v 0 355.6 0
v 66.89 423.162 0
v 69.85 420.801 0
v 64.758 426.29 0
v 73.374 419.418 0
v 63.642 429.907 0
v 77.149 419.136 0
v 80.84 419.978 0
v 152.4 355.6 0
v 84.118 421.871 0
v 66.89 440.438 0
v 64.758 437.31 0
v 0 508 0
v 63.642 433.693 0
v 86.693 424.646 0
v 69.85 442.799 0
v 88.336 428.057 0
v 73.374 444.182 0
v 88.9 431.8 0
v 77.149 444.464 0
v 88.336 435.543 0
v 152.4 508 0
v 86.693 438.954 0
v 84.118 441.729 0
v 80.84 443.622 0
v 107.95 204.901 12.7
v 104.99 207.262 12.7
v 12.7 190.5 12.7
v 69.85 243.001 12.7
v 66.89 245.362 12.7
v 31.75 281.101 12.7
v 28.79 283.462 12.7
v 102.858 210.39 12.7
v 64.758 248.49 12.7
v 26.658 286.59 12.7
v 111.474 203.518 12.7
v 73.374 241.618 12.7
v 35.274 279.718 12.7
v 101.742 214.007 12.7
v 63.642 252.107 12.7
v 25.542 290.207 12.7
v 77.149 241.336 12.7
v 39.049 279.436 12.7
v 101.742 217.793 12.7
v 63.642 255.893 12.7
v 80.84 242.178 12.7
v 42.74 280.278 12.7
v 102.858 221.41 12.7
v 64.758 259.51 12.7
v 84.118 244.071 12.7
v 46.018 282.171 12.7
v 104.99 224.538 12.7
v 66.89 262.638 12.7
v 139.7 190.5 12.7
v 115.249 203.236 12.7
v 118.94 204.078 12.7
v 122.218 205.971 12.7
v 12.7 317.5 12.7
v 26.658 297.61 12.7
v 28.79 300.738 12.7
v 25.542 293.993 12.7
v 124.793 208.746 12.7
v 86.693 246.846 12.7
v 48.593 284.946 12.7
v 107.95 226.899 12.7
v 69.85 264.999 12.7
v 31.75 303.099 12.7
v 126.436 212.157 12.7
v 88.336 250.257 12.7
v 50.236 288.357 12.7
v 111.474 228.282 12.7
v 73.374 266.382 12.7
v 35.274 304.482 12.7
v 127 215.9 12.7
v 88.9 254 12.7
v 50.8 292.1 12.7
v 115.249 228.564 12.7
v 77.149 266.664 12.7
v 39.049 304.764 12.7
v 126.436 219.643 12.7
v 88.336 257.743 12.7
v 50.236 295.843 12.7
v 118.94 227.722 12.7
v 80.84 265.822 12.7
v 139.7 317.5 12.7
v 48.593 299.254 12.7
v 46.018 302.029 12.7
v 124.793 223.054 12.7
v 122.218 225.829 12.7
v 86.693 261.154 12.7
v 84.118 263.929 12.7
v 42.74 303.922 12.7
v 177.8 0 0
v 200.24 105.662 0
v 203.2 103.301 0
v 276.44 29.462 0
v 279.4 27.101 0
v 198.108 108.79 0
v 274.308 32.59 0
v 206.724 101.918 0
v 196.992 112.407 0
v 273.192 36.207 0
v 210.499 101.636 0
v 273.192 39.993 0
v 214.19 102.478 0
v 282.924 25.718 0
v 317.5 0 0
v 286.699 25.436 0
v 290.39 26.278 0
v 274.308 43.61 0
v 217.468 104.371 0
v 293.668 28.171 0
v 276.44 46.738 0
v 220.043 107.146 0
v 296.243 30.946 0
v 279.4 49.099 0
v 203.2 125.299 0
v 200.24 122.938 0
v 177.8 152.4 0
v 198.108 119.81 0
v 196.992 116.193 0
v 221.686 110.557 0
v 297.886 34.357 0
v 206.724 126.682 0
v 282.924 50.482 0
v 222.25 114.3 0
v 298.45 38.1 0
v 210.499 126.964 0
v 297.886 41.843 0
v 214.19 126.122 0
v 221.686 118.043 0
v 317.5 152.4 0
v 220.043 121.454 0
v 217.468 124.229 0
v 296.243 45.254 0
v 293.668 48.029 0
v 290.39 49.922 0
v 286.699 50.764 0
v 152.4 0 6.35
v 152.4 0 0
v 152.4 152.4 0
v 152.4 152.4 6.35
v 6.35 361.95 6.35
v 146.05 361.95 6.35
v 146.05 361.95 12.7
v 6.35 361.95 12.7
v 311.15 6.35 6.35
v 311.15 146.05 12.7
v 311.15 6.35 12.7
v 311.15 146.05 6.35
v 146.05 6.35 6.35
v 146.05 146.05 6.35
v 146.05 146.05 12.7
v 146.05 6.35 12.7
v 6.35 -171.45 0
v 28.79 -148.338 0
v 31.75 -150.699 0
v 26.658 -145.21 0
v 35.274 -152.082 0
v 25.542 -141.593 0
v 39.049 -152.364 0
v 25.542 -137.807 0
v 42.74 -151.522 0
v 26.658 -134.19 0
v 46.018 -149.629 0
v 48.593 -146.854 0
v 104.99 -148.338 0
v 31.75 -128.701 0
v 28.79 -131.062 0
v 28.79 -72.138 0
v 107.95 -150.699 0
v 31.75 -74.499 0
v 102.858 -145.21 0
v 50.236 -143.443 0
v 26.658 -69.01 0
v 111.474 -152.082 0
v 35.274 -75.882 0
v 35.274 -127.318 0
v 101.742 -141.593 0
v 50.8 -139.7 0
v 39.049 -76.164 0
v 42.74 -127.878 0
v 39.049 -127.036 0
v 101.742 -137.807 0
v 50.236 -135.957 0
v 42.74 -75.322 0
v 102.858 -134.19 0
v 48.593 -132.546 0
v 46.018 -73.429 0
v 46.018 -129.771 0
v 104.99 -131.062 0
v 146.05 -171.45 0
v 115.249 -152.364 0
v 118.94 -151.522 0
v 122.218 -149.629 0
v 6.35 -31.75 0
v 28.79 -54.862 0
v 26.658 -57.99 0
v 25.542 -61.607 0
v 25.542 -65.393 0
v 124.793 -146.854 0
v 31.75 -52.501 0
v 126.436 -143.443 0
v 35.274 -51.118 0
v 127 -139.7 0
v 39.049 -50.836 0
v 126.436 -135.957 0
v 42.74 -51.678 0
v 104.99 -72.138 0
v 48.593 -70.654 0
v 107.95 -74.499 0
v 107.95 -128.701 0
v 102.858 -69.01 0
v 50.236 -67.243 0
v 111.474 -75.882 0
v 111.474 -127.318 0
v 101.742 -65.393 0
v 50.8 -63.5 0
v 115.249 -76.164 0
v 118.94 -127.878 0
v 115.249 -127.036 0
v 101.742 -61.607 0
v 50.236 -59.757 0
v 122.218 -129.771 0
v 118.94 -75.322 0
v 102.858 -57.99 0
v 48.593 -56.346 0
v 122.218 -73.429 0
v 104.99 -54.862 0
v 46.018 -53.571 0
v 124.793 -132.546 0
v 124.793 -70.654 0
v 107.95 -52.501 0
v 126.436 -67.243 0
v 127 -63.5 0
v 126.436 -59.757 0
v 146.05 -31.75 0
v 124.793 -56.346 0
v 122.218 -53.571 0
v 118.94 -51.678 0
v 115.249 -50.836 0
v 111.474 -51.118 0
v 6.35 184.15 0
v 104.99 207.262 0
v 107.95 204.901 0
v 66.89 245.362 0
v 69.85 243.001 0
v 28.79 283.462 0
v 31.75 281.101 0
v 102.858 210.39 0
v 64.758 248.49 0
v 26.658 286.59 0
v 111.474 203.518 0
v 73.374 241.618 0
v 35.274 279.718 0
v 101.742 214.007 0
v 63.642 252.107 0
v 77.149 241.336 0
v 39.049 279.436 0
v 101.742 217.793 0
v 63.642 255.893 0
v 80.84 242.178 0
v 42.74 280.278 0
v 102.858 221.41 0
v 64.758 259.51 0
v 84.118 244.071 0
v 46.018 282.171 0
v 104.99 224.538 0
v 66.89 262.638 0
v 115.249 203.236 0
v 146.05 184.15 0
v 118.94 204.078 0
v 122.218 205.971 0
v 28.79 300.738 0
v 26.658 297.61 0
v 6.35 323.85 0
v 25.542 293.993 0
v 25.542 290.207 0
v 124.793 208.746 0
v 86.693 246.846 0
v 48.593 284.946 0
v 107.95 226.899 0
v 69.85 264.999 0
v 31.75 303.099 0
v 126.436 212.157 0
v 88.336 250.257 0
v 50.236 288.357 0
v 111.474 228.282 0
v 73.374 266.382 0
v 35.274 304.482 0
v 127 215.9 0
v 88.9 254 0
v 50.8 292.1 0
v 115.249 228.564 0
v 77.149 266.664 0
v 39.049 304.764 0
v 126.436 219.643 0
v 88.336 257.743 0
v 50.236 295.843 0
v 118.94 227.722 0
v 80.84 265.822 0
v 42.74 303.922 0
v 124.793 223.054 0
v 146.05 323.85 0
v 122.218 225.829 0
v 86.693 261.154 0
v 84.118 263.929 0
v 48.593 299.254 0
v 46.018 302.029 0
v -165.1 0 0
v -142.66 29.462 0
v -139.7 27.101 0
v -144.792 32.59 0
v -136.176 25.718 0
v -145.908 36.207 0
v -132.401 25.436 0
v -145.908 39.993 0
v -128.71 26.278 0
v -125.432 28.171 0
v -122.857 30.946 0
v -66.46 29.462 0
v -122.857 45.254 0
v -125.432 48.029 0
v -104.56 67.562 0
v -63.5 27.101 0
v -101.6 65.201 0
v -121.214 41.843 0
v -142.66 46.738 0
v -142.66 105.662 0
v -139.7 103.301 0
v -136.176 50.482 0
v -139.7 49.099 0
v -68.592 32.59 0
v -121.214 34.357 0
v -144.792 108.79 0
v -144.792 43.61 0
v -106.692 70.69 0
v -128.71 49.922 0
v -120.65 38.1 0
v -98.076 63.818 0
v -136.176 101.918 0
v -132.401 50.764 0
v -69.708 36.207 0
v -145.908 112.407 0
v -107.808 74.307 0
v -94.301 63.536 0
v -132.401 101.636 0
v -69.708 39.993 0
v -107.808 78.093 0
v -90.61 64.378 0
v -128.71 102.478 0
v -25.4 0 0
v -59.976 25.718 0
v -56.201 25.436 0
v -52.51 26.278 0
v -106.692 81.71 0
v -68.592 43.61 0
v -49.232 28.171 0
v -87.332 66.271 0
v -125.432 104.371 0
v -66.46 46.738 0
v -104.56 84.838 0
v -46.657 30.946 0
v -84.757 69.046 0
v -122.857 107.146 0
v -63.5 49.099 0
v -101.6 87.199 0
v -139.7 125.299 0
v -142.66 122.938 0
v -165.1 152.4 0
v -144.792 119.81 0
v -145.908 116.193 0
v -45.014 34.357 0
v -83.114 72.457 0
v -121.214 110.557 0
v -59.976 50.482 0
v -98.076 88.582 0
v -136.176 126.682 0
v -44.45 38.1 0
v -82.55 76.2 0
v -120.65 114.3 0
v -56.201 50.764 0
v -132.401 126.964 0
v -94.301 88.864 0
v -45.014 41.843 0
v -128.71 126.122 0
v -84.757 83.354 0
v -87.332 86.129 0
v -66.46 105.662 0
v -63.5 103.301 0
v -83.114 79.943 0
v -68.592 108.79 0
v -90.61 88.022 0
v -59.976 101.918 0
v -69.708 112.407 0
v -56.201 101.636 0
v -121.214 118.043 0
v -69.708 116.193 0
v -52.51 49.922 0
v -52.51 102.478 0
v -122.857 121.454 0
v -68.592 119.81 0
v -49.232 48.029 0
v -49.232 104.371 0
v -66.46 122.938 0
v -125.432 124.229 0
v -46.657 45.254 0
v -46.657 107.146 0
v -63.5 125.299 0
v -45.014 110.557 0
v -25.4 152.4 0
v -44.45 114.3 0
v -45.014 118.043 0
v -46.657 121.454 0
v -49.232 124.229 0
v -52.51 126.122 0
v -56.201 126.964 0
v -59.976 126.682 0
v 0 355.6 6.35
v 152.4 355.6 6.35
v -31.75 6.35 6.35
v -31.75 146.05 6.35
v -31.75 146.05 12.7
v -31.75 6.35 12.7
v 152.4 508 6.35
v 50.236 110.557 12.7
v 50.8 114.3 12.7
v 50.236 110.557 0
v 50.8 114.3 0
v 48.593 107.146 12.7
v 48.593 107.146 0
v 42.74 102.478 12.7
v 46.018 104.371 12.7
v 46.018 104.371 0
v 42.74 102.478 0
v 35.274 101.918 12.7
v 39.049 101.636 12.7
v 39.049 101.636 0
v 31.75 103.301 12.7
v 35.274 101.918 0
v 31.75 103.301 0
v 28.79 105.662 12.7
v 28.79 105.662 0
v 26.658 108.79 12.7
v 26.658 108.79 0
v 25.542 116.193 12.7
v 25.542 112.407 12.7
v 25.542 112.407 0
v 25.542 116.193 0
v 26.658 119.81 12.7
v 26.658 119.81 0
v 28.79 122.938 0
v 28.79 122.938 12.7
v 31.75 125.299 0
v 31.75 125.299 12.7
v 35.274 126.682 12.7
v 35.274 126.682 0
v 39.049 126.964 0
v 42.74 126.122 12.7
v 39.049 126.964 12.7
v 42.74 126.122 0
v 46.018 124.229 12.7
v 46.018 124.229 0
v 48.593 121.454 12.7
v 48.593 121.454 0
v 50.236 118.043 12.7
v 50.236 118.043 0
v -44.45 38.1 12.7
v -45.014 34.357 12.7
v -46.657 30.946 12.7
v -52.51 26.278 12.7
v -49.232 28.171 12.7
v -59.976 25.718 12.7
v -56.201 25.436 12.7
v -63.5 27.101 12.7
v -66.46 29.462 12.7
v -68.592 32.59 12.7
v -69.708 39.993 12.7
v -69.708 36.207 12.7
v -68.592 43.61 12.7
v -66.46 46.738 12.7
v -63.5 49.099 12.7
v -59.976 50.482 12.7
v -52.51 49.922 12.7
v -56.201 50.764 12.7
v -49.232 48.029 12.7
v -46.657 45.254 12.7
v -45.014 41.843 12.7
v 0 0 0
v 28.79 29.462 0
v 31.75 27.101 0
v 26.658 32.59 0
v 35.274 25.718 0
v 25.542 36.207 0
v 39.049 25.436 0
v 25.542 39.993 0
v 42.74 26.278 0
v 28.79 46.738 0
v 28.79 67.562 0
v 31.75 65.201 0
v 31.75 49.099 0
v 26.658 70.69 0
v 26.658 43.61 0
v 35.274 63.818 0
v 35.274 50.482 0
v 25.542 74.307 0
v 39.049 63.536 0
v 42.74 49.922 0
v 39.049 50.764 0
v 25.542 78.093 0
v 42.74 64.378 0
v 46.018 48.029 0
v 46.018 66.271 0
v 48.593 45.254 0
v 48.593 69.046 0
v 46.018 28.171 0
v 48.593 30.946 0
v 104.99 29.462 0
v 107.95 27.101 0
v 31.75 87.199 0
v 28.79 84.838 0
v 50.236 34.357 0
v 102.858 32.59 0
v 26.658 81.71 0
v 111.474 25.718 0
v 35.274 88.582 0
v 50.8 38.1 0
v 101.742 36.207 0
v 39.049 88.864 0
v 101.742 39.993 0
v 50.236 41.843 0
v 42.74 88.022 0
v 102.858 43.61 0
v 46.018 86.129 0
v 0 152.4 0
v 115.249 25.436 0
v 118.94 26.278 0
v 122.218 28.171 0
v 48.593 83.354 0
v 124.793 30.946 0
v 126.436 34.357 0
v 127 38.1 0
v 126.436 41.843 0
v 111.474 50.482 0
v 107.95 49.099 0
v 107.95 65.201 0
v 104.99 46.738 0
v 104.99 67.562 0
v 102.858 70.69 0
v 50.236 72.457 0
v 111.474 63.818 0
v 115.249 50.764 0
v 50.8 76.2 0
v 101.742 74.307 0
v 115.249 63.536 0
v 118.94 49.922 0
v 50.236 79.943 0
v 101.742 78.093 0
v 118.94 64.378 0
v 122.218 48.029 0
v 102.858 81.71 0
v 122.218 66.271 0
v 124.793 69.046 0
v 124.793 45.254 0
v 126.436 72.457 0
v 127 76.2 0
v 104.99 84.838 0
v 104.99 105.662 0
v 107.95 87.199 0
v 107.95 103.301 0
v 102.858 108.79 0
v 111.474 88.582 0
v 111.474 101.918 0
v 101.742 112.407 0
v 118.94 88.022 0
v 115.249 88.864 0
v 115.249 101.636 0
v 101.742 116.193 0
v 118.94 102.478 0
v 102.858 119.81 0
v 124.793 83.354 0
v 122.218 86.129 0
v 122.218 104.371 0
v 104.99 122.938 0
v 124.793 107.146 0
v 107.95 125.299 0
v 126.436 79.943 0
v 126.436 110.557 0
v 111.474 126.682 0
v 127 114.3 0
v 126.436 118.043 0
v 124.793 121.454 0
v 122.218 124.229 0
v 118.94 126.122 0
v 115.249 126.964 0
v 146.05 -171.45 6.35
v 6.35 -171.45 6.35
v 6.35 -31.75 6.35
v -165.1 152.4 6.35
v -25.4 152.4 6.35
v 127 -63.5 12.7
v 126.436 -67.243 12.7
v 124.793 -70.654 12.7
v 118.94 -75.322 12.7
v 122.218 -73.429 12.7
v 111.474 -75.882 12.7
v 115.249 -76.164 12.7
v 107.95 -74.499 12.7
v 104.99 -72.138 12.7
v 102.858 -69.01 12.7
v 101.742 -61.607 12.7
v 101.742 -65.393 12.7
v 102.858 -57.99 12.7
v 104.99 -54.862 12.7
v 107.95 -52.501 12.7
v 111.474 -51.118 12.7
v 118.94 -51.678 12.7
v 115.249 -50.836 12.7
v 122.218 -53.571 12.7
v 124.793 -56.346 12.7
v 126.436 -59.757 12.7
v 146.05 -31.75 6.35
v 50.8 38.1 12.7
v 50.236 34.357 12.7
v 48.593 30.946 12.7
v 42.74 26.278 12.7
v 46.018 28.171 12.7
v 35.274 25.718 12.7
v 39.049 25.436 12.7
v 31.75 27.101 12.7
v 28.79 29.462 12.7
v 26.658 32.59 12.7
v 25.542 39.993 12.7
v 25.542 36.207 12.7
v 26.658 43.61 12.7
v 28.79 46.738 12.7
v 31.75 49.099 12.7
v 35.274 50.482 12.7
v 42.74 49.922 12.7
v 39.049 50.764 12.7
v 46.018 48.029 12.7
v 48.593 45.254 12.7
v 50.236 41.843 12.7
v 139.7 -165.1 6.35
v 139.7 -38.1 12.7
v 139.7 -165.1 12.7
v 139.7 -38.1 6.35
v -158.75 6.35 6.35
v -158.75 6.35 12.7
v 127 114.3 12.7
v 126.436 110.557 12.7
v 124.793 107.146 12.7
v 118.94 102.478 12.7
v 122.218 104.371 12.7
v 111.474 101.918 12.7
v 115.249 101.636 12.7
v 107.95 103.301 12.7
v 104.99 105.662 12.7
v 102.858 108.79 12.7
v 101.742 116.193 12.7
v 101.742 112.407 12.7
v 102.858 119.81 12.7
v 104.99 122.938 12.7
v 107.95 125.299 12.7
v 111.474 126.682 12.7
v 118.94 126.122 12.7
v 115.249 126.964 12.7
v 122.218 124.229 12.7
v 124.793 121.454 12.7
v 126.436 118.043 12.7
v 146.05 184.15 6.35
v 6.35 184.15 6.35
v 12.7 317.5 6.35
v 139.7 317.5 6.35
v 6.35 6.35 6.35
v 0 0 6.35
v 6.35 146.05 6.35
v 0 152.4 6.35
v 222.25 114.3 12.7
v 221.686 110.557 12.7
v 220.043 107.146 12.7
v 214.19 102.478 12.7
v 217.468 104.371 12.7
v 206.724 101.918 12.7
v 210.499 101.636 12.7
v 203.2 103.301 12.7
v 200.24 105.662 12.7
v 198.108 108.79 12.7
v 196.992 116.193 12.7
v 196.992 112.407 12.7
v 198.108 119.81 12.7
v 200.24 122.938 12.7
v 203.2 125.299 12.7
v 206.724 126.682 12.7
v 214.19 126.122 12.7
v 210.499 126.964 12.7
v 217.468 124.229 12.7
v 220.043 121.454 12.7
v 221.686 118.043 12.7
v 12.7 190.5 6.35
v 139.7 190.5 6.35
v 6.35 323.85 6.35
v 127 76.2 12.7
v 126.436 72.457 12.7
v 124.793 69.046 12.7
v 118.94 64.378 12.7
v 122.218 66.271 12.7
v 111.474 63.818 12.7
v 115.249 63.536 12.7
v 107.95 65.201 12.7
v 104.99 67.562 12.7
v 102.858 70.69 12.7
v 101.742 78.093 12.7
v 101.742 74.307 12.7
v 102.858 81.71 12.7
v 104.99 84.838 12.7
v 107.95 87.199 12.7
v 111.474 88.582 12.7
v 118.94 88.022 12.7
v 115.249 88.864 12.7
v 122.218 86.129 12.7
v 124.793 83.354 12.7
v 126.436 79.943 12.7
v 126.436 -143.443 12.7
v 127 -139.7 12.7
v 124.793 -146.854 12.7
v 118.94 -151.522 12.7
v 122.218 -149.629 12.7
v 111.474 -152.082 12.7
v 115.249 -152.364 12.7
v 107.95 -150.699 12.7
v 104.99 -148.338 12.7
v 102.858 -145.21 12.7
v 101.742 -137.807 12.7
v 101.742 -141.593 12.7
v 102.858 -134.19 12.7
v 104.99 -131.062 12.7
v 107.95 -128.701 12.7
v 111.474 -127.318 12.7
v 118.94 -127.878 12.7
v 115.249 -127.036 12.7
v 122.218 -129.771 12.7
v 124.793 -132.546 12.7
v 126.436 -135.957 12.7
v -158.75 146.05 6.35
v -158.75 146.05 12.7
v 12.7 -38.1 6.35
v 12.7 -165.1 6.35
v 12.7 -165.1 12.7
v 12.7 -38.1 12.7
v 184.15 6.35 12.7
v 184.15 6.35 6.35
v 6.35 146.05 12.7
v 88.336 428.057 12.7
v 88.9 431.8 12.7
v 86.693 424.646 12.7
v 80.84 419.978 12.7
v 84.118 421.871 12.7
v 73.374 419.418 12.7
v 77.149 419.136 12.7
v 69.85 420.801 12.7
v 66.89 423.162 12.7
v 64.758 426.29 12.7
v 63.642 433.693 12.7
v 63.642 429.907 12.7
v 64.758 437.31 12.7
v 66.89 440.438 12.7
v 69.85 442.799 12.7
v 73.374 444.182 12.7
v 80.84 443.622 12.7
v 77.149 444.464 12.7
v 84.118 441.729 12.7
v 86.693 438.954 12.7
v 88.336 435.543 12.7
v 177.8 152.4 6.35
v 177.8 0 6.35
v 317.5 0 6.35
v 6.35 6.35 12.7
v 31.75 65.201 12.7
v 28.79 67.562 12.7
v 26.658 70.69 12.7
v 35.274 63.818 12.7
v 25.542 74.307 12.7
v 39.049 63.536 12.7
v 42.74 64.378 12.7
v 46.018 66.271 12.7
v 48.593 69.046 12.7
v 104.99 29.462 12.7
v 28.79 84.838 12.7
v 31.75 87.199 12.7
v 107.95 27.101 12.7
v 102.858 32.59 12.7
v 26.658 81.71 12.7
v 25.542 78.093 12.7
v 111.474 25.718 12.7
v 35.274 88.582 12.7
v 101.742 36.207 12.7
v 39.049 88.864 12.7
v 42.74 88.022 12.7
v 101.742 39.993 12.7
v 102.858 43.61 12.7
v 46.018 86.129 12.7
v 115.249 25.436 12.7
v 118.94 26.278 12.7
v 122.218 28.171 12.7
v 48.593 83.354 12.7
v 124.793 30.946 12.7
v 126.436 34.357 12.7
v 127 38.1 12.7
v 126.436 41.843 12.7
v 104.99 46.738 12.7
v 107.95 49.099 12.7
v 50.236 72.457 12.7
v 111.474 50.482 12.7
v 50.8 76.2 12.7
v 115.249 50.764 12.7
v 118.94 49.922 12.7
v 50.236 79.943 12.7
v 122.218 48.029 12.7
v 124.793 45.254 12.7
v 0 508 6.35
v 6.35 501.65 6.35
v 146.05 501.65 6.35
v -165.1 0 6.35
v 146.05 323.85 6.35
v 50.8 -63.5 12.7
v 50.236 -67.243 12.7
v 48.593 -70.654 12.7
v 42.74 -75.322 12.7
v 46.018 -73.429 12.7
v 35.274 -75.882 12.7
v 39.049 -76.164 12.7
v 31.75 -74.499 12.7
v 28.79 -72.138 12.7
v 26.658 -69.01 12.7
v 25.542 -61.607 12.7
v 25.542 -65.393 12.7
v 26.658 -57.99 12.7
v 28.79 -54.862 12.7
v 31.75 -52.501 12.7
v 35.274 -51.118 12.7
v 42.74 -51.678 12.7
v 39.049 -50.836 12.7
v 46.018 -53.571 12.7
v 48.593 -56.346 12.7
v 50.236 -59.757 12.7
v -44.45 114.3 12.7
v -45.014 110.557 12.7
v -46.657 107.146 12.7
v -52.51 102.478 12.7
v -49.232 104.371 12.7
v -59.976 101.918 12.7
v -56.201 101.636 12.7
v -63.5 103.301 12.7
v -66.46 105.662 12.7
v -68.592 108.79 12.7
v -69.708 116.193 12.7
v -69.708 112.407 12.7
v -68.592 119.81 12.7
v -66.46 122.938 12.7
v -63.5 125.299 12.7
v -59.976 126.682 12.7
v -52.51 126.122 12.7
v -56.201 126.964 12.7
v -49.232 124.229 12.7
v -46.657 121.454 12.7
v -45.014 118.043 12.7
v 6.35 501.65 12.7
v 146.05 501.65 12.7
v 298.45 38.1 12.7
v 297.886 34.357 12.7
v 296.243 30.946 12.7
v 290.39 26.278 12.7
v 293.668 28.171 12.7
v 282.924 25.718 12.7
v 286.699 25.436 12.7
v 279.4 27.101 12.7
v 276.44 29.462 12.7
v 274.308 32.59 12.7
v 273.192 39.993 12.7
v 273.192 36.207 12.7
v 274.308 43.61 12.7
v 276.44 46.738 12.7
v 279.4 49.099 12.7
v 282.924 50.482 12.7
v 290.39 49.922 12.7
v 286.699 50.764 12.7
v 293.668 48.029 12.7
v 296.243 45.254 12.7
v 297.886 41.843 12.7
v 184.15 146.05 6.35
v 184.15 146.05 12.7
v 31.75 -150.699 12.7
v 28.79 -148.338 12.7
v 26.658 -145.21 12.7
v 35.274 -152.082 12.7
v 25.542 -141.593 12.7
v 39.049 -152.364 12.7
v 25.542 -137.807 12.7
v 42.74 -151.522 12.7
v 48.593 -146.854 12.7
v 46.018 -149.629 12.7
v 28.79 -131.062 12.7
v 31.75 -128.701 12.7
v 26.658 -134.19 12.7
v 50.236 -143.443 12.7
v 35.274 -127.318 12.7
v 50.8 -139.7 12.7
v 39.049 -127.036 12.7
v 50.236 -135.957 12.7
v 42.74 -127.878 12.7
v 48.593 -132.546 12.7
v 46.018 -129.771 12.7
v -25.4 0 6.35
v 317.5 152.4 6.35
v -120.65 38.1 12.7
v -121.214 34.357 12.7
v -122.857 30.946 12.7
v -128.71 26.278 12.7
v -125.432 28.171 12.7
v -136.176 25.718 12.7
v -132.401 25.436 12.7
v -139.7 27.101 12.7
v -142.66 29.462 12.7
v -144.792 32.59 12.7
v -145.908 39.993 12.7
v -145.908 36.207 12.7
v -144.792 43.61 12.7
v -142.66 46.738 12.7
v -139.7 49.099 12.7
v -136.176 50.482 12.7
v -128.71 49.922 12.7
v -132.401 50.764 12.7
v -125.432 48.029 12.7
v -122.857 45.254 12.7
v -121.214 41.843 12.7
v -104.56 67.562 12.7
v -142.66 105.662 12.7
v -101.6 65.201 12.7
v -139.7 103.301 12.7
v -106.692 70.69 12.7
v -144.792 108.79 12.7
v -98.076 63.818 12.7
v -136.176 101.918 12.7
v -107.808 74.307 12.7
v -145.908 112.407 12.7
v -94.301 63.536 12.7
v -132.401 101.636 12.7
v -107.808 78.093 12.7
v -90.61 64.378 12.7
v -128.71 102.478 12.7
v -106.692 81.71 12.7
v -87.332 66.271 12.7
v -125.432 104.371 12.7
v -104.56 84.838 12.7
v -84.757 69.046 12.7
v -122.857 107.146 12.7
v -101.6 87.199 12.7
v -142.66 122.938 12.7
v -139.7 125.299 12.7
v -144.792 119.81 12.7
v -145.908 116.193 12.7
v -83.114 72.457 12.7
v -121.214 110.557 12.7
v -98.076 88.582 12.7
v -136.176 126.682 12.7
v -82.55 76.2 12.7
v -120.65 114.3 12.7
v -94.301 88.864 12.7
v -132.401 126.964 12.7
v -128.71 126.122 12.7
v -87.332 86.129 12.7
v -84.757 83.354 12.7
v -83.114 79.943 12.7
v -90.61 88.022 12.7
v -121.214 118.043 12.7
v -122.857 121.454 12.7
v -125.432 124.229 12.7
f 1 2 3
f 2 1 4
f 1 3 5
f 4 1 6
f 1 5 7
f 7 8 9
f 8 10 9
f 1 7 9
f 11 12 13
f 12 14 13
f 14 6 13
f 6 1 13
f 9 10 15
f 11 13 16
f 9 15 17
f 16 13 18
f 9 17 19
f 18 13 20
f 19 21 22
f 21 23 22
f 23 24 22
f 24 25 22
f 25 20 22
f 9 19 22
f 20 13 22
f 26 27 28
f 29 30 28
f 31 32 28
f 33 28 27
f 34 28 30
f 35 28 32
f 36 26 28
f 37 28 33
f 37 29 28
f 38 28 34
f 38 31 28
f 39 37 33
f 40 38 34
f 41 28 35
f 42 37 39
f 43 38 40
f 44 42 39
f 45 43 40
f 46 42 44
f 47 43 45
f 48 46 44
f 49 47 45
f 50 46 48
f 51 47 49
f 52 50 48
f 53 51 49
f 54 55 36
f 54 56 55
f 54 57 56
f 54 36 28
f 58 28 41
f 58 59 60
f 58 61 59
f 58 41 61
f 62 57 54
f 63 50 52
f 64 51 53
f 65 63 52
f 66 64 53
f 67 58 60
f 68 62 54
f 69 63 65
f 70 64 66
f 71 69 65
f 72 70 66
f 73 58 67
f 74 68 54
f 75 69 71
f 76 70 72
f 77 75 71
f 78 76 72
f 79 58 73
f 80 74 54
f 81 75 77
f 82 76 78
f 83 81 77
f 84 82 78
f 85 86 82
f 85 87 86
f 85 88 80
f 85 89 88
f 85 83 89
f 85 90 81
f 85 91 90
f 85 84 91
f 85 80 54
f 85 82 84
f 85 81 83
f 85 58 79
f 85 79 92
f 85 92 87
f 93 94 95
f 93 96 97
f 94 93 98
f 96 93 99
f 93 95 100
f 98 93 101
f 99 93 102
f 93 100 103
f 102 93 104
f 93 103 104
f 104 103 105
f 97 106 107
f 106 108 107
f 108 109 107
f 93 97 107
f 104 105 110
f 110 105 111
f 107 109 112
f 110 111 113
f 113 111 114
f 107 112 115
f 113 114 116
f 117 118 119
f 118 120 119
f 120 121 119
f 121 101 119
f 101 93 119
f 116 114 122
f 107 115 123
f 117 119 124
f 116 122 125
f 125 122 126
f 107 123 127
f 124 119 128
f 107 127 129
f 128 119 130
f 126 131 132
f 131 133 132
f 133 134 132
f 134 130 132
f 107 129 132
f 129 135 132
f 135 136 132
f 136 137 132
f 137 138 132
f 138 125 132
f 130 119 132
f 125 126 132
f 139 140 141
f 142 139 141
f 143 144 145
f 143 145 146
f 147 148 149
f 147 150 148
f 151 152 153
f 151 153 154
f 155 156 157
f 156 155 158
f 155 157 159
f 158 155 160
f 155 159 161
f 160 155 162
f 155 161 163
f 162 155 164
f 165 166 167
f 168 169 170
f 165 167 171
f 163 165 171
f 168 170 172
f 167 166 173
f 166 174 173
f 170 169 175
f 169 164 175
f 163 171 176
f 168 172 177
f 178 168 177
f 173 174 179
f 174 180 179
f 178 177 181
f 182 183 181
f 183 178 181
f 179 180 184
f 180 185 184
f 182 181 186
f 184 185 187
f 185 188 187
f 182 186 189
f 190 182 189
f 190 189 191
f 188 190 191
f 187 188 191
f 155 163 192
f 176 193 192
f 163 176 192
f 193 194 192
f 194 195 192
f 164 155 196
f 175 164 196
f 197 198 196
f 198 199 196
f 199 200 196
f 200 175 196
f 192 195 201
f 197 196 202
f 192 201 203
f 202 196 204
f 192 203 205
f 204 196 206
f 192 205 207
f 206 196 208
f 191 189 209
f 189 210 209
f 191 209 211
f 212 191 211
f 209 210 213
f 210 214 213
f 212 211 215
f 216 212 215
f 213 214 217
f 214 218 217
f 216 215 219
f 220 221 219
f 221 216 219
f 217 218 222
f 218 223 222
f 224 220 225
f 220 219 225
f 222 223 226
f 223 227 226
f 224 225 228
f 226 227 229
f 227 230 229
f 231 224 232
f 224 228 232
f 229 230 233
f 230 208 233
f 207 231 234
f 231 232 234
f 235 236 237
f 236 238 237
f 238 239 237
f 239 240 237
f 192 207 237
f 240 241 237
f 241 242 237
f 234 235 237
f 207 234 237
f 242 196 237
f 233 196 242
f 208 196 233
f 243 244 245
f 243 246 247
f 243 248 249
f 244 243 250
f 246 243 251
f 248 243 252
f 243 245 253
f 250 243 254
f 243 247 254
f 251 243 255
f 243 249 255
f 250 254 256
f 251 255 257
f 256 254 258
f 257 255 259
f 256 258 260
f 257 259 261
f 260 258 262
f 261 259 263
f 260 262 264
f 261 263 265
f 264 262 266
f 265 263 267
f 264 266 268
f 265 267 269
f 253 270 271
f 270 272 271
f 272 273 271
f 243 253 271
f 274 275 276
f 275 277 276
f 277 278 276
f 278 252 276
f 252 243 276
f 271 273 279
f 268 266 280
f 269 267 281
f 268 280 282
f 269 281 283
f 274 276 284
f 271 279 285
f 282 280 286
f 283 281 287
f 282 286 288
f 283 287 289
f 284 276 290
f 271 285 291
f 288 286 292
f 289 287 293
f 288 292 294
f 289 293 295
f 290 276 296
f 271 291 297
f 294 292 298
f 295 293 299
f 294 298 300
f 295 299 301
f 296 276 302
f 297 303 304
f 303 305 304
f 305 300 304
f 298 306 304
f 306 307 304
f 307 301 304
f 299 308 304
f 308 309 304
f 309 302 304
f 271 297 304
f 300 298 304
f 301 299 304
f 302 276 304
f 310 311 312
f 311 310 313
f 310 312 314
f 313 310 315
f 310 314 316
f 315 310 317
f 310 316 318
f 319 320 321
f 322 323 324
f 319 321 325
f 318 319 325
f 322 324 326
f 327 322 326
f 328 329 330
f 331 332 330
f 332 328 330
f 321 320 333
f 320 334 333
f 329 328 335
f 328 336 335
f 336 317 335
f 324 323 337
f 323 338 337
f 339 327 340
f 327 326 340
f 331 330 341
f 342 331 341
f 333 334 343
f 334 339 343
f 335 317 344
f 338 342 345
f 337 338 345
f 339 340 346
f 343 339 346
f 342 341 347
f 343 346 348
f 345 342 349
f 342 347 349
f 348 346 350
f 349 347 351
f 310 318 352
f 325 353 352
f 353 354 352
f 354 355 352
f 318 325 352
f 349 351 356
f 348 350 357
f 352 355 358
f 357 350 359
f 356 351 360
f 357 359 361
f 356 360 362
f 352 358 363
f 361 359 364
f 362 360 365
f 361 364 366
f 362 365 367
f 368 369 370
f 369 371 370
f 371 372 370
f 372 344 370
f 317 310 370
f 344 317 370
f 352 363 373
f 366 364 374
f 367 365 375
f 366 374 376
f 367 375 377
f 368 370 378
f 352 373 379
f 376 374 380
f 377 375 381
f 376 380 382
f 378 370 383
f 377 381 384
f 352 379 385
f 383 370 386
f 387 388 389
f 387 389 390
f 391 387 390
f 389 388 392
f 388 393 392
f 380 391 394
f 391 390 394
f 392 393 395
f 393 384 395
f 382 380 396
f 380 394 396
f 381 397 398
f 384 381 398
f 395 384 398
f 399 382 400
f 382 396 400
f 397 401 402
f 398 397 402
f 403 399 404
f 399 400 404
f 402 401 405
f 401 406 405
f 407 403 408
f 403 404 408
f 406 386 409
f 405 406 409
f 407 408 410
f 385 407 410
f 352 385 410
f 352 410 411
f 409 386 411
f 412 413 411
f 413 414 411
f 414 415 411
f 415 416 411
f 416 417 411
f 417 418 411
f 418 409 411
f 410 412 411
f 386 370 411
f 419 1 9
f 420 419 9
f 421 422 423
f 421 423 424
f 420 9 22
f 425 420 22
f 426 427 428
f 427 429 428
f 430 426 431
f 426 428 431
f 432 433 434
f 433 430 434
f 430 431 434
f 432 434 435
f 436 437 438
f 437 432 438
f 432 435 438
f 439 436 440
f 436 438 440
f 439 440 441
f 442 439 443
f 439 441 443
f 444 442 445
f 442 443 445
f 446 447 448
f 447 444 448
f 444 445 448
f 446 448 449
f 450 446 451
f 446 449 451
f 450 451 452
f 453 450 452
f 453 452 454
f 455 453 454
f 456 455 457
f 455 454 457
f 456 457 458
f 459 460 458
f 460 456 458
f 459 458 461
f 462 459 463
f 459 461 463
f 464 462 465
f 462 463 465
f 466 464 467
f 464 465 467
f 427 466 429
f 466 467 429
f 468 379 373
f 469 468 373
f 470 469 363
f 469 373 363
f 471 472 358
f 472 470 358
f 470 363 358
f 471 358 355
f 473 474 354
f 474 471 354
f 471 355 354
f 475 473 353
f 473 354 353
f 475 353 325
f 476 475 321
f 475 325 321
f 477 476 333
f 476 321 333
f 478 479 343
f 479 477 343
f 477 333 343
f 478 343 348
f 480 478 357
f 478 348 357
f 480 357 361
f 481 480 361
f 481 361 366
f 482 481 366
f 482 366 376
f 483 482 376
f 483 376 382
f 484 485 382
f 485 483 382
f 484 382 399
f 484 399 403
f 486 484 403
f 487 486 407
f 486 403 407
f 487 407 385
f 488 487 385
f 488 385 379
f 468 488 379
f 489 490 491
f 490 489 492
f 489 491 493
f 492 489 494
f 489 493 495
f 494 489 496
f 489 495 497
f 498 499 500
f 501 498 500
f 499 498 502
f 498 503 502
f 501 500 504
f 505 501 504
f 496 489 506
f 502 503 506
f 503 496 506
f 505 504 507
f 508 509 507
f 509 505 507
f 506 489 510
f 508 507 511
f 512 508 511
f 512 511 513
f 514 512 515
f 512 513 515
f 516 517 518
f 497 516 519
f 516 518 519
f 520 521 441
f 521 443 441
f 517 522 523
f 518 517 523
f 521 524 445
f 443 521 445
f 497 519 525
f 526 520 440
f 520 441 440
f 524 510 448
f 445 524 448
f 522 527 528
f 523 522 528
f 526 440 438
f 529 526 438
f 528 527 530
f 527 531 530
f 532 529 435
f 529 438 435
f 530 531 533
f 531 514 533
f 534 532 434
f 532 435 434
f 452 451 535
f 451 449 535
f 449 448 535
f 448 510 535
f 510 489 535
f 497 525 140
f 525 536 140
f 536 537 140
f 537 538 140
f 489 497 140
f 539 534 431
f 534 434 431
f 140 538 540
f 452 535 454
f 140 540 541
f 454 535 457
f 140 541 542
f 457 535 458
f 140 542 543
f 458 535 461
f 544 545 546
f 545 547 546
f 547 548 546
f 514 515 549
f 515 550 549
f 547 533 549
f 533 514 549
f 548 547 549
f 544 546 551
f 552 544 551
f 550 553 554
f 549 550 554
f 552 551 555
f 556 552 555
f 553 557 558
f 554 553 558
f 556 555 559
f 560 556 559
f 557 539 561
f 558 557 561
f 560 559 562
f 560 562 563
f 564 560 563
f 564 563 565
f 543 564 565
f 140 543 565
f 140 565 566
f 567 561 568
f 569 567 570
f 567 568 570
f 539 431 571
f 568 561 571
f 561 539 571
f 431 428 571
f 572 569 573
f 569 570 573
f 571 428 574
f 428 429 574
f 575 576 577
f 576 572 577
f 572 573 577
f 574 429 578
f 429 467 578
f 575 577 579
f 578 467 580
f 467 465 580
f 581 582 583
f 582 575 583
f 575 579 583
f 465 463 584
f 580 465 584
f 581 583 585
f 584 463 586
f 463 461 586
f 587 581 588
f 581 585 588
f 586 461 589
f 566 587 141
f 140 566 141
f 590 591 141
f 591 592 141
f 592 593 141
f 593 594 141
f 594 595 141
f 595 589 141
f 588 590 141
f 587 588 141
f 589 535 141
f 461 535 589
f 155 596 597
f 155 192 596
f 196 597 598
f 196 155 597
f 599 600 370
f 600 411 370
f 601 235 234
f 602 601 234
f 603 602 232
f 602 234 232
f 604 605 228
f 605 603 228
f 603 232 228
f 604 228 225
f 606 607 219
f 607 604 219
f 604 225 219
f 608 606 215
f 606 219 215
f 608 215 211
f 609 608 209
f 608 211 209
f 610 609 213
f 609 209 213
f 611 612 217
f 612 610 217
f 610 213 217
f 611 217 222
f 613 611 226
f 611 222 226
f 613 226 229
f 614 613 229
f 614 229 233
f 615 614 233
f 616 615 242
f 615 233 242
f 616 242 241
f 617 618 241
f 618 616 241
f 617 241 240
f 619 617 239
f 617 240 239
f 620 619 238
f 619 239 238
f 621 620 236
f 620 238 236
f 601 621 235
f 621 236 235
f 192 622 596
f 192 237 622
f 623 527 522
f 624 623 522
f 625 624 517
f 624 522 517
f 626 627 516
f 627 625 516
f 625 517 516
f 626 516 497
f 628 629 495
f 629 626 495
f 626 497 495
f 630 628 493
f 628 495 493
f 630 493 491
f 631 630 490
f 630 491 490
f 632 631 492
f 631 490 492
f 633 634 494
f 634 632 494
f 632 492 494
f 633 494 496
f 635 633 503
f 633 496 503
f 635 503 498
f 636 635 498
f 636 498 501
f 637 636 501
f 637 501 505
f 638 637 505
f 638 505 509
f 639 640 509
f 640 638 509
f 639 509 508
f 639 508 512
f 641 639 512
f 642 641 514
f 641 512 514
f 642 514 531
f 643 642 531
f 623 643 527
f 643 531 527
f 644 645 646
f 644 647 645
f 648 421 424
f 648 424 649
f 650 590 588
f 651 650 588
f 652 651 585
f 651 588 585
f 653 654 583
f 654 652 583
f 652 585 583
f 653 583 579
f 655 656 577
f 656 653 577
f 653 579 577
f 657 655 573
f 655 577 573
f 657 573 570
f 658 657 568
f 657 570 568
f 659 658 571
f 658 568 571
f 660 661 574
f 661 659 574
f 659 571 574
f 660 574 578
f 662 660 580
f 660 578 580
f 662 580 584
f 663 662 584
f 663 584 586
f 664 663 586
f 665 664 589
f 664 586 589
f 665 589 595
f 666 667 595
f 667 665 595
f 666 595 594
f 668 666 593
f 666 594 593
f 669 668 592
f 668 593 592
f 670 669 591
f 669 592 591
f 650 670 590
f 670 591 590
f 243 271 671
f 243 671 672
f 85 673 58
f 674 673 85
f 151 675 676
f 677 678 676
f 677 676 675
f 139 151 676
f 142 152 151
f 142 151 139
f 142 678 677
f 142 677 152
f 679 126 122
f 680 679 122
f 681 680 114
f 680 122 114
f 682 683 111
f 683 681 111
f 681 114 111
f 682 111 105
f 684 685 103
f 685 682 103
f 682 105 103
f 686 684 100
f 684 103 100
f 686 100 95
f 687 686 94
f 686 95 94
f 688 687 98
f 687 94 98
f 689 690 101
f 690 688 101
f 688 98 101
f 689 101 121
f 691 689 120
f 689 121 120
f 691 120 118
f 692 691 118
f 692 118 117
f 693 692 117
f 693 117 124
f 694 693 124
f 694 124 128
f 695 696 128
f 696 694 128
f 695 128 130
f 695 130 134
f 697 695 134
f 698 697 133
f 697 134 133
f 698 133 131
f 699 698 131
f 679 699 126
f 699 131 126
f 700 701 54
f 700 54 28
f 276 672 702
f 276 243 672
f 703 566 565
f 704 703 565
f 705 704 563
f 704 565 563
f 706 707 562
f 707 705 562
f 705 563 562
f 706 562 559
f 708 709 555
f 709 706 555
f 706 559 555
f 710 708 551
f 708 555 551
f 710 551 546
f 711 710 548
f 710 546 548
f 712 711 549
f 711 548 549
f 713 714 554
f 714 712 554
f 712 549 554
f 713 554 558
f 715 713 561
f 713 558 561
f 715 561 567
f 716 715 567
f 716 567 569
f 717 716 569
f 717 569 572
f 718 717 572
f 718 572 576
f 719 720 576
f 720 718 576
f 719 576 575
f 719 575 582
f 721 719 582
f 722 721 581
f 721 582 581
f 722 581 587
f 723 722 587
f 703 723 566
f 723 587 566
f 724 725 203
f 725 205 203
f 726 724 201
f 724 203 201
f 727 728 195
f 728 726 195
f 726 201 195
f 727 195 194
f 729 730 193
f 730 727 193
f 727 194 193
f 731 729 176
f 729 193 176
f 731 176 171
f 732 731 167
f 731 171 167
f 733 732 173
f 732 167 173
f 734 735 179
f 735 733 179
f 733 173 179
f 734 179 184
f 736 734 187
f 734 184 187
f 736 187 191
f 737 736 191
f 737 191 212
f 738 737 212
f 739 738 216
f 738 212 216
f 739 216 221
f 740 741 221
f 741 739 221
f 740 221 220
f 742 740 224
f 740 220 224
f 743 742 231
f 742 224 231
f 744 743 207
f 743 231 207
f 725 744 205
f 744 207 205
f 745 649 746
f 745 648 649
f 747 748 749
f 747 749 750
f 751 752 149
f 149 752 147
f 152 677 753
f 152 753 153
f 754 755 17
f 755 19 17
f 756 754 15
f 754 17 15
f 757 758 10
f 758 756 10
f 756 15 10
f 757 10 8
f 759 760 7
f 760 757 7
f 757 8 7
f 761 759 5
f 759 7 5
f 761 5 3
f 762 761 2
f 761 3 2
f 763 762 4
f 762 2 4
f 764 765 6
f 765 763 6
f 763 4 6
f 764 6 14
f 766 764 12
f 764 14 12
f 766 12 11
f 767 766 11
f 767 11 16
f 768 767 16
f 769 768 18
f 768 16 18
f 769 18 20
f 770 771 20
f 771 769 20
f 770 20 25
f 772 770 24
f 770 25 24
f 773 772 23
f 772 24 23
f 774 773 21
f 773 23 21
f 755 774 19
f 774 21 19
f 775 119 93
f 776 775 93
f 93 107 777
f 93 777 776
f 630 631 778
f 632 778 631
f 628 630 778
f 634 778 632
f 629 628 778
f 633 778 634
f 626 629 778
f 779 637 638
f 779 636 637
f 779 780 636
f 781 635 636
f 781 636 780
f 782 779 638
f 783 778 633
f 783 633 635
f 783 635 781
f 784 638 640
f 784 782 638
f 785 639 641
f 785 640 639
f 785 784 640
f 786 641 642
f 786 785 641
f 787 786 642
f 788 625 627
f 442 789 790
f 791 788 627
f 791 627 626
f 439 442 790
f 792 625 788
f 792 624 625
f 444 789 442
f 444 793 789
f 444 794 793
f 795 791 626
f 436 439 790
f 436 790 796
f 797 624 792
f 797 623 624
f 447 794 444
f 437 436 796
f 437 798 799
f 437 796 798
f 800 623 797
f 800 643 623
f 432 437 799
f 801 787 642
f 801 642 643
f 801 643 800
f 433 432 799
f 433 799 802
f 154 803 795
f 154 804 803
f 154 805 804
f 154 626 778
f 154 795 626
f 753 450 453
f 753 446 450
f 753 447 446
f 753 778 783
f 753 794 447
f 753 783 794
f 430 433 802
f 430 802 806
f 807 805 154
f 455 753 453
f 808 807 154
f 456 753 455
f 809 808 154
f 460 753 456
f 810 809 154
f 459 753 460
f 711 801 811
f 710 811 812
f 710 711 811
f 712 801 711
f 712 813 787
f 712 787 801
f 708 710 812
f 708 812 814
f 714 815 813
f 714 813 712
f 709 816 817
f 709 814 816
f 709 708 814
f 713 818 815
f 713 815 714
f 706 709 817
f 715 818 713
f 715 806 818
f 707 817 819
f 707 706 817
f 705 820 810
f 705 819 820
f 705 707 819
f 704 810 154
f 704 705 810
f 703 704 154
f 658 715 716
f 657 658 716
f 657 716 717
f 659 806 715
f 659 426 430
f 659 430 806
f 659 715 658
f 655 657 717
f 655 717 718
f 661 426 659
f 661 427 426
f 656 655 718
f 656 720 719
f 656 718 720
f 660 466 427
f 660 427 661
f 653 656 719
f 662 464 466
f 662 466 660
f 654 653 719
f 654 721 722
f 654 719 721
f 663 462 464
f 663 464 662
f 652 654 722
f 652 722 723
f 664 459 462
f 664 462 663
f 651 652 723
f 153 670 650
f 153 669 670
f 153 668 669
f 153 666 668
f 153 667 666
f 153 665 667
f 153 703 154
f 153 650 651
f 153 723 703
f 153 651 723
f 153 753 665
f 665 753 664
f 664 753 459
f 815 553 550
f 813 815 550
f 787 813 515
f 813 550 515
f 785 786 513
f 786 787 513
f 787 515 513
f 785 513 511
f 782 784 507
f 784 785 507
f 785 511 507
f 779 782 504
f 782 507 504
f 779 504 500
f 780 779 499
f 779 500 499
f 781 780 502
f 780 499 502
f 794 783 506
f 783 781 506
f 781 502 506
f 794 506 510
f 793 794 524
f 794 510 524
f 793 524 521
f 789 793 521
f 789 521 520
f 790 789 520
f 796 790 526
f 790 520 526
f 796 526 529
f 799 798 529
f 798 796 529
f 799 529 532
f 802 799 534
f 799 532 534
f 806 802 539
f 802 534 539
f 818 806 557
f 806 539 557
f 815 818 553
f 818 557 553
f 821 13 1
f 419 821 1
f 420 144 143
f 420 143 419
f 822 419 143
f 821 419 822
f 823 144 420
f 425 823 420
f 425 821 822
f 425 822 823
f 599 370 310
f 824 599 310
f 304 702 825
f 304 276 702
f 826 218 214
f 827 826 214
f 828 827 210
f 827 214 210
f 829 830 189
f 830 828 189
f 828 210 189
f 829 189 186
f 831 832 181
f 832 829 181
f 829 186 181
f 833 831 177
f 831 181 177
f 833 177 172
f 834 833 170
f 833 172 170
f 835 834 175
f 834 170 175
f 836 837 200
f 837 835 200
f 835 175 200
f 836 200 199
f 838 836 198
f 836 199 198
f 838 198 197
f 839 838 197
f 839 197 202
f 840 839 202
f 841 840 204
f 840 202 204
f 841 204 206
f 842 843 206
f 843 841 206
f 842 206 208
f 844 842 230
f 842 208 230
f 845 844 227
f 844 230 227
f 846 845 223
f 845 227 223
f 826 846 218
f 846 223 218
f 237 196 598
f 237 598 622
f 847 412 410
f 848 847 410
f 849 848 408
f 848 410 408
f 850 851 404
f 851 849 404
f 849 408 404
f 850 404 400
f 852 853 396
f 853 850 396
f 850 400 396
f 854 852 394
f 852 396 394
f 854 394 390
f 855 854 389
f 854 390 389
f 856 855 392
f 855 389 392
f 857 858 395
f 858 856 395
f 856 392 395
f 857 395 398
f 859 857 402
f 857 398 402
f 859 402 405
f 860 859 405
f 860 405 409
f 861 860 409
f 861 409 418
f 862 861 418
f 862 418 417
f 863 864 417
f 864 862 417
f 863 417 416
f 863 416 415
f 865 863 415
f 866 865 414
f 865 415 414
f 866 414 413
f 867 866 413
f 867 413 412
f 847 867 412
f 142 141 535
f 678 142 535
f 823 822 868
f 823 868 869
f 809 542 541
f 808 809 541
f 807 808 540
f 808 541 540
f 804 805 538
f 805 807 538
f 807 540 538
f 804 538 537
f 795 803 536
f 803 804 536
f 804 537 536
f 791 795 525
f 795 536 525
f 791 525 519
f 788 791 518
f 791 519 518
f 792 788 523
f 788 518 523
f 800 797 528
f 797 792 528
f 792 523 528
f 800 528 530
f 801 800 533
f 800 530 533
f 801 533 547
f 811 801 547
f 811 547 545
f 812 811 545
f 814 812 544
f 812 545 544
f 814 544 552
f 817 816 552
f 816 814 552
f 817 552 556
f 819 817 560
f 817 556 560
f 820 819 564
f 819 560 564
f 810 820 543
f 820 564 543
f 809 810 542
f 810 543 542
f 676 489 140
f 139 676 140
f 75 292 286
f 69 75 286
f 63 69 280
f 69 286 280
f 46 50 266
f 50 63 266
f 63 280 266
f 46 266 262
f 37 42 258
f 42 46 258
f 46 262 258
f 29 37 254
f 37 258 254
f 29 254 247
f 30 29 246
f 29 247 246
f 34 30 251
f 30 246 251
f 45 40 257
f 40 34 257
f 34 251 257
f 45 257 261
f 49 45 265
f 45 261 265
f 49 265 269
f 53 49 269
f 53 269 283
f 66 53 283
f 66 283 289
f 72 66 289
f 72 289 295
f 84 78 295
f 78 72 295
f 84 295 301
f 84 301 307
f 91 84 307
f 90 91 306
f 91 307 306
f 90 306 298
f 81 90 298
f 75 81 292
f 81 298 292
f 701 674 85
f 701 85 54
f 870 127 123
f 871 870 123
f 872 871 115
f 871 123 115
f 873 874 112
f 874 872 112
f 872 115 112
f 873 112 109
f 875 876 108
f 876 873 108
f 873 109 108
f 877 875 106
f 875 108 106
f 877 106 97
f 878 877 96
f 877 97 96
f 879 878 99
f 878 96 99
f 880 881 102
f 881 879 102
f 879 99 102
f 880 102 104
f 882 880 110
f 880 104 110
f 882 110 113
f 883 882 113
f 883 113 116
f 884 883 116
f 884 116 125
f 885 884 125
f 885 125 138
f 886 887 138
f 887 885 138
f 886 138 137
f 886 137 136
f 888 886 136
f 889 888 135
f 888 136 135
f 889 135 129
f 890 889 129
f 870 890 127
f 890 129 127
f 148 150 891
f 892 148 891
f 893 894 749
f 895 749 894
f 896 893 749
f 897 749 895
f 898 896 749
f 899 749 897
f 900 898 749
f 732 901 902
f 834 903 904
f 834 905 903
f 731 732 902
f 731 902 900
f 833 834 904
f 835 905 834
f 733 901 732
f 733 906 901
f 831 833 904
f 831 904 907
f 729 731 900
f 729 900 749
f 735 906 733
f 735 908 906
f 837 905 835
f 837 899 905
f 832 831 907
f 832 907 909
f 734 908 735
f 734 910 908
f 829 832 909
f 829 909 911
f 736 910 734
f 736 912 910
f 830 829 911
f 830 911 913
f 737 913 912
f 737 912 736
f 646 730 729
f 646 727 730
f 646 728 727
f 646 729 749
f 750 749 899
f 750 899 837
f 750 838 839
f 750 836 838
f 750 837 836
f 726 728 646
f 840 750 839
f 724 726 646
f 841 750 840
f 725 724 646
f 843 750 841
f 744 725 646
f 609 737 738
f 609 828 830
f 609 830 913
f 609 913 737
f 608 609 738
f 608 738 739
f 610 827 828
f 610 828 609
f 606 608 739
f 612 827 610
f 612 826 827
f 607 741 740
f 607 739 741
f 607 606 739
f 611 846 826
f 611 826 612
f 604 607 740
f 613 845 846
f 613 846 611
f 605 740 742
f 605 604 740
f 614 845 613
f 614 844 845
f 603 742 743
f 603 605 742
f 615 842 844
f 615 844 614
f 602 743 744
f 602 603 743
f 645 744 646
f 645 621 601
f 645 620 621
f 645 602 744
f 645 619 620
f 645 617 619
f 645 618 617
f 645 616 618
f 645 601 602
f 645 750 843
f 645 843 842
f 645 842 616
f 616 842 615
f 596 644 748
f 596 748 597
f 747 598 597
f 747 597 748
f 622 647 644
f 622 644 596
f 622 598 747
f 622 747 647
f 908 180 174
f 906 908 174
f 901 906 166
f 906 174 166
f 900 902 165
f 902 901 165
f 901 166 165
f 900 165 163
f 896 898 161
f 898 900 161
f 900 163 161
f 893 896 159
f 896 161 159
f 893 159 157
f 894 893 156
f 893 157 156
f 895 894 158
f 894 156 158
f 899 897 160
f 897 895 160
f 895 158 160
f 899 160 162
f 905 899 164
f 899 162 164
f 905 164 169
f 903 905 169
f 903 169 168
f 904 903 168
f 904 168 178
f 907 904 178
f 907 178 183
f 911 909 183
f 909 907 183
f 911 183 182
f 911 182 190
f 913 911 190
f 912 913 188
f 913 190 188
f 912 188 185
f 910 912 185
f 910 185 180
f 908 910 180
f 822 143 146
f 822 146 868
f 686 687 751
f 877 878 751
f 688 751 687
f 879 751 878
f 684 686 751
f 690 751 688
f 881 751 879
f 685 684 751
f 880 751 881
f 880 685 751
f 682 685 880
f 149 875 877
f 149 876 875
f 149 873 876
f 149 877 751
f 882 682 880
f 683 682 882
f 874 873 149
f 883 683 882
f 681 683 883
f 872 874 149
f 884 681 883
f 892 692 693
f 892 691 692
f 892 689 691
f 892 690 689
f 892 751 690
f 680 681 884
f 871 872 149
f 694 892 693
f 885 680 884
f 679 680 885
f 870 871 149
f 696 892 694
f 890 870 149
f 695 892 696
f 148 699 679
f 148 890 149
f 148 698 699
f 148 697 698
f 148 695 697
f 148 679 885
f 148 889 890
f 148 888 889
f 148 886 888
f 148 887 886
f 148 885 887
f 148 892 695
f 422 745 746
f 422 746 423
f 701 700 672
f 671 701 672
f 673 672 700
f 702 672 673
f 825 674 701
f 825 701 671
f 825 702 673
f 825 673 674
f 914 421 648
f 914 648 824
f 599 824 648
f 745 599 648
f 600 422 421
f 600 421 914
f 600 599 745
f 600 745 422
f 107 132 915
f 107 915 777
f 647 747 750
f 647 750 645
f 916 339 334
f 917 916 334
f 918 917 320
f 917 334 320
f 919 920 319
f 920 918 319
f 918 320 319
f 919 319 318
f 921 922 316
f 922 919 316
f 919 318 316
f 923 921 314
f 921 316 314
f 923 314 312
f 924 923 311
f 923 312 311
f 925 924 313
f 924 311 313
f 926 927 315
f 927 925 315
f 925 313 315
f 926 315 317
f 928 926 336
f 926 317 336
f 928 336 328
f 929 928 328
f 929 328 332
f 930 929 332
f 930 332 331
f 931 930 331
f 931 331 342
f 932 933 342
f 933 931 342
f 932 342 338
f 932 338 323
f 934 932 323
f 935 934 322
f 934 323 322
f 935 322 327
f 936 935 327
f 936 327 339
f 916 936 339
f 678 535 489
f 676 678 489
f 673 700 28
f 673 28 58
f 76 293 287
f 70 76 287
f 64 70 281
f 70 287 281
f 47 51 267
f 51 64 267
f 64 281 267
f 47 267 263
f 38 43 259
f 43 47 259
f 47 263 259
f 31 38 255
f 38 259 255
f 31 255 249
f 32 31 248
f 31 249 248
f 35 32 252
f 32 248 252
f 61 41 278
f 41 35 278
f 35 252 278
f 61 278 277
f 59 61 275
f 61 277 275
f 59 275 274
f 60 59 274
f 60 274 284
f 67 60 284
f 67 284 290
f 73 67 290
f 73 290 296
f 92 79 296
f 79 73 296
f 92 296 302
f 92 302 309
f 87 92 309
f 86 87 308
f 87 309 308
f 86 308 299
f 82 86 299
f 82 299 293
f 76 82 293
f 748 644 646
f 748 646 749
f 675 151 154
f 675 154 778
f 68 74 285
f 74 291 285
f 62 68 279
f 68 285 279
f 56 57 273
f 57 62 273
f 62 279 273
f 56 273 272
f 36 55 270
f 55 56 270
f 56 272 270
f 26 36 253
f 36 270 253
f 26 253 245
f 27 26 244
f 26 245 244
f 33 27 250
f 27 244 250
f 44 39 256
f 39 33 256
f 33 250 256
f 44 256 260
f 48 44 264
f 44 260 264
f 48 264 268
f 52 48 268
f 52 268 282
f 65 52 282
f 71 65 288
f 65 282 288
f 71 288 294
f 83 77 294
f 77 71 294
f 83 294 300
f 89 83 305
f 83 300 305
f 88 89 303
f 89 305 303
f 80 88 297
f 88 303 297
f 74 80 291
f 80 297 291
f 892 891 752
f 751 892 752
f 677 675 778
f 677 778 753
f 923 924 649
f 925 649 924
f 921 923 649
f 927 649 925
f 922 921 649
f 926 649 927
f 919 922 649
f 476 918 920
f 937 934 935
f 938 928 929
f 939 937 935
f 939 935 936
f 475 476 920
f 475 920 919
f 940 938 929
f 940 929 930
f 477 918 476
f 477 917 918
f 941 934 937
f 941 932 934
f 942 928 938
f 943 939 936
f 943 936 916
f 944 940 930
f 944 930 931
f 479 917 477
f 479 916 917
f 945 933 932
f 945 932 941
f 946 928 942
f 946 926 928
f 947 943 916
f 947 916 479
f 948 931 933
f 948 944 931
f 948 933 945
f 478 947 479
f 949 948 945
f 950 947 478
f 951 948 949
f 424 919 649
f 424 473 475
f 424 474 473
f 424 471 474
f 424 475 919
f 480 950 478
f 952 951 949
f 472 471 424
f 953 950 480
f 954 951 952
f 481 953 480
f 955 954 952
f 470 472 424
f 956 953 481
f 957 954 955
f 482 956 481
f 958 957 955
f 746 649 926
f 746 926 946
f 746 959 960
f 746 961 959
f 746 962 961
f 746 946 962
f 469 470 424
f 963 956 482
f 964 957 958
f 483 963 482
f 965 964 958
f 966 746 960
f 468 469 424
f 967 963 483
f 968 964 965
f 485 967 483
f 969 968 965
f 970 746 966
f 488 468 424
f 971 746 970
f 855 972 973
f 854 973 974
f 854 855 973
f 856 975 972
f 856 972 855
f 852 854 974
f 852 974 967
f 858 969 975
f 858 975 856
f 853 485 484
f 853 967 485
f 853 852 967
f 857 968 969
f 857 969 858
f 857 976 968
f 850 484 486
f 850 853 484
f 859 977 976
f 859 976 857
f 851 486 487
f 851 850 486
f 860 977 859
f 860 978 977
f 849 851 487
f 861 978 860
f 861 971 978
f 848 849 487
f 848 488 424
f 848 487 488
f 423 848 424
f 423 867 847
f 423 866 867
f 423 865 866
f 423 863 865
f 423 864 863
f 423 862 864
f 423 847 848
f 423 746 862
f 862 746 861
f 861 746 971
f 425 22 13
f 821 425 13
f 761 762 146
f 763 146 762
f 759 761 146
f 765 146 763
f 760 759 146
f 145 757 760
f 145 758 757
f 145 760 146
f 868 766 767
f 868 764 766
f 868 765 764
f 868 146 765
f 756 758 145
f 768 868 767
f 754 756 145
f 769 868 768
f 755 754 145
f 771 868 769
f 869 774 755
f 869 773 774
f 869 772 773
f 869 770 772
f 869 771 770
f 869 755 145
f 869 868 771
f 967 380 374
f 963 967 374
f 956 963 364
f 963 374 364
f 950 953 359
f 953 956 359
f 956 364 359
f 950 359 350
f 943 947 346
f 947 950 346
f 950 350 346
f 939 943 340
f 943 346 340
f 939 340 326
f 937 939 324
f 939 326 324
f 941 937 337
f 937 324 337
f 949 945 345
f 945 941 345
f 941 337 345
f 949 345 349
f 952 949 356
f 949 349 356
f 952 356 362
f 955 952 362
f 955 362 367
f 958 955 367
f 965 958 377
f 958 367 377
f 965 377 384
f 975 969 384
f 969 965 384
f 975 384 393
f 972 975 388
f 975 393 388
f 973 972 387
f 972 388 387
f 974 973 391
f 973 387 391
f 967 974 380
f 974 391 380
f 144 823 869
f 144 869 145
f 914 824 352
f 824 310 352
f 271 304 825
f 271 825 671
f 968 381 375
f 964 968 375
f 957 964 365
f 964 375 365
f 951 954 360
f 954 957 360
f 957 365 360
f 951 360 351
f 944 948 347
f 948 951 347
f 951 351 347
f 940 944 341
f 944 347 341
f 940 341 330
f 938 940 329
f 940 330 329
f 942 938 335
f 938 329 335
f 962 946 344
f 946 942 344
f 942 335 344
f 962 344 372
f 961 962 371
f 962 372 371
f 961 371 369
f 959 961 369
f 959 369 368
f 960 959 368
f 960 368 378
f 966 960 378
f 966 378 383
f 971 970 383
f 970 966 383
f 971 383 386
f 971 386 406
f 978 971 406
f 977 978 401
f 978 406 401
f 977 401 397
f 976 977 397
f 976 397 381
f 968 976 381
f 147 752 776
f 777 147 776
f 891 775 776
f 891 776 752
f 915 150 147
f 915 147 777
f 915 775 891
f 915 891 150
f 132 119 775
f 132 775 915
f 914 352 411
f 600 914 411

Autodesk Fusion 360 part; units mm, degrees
sketch "Sketch1" plane through (0, 0, 0) normal (0, 0, 1) x (1, 0, 0)
  line L0 (0, 0) -> (152.4, 0)
  line L1 (152.4, 0) -> (152.4, 152.4)
  line L2 (152.4, 152.4) -> (0, 152.4)
  line L3 (0, 152.4) -> (0, 0)
  circle A0 centre (38.1, 38.1) radius 12.7
  circle A1 centre (38.1, 114.3) radius 12.7
  circle A2 centre (114.3, 114.3) radius 12.7
  circle A3 centre (114.3, 38.1) radius 12.7
  circle A4 centre (114.3, 76.2) radius 12.7
  circle A5 centre (38.1, 76.2) radius 12.7
  circle A6 centre (76.2, 431.8) radius 12.7
  line L4 (152.4, 508) -> (0, 508)
  line L5 (152.4, 355.6) -> (152.4, 508)
  line L6 (0, 508) -> (0, 355.6)
  line L7 (0, 355.6) -> (152.4, 355.6)
  circle A7 centre (-95.25, 76.2) radius 12.7
  circle A8 centre (-57.15, 38.1) radius 12.7
  circle A9 centre (-57.15, 114.3) radius 12.7
  line L8 (-165.1, 0) -> (-25.4, 0)
  line L9 (-25.4, 152.4) -> (-165.1, 152.4)
  circle A10 centre (-133.35, 114.3) radius 12.7
  circle A11 centre (-133.35, 38.1) radius 12.7
  circle A12 centre (285.75, 38.1) radius 12.7
  circle A13 centre (209.55, 114.3) radius 12.7
  circle A14 centre (114.3, -63.5) radius 12.7
  circle A15 centre (38.1, -63.5) radius 12.7
  line L10 (12.7, -38.1) -> (139.7, -38.1)
  line L11 (139.7, -38.1) -> (139.7, -165.1)
  line L12 (12.7, -165.1) -> (12.7, -38.1)
  circle A16 centre (38.1, -139.7) radius 12.7
  circle A17 centre (114.3, -139.7) radius 12.7
  line L13 (139.7, -165.1) -> (12.7, -165.1)
  circle A18 centre (76.2, 254) radius 12.7
  circle A19 centre (114.3, 215.9) radius 12.7
  line L14 (139.7, 317.5) -> (139.7, 190.5)
  line L15 (139.7, 190.5) -> (12.7, 190.5)
  line L16 (12.7, 317.5) -> (139.7, 317.5)
  circle A20 centre (38.1, 292.1) radius 12.7
  line L17 (12.7, 190.5) -> (12.7, 317.5)
  line L18 (6.35, 146.05) -> (146.05, 146.05)
  line L19 (146.05, 146.05) -> (146.05, 6.35)
  line L20 (146.05, 6.35) -> (6.35, 6.35)
  line L21 (6.35, 6.35) -> (6.35, 146.05)
  line L22 (6.35, 501.65) -> (146.05, 501.65)
  line L23 (146.05, 501.65) -> (146.05, 361.95)
  line L24 (146.05, 361.95) -> (6.35, 361.95)
  line L25 (6.35, 361.95) -> (6.35, 501.65)
  line L26 (184.15, 146.05) -> (184.15, 6.35)
  line L27 (184.15, 6.35) -> (311.15, 6.35)
  line L28 (311.15, 146.05) -> (311.15, 6.35)
  line L29 (177.8, 152.4) -> (177.8, 0)
  line L30 (177.8, 152.4) -> (317.5, 152.4)
  line L31 (317.5, 152.4) -> (317.5, 0)
  line L32 (317.5, 0) -> (177.8, 0)
  line L33 (-165.1, 152.4) -> (-165.1, 0)
  line L34 (-158.75, 6.35) -> (-158.75, 146.05)
  line L35 (-158.75, 146.05) -> (-31.75, 146.05)
  line L36 (6.35, -31.75) -> (146.05, -31.75)
  line L37 (146.05, -31.75) -> (146.05, -171.45)
  line L38 (146.05, -171.45) -> (6.35, -171.45)
  line L39 (6.35, -171.45) -> (6.35, -31.75)
  line L40 (146.05, 323.85) -> (146.05, 184.15)
  line L41 (146.05, 184.15) -> (6.35, 184.15)
  line L42 (6.35, 184.15) -> (6.35, 323.85)
  line L43 (6.35, 323.85) -> (146.05, 323.85)
  line L44 (-25.4, 0) -> (-25.4, 152.4)
  line L45 (-31.75, 146.05) -> (-31.75, 6.35)
  line L46 (-31.75, 6.35) -> (-158.75, 6.35)
  line L47 (311.15, 146.05) -> (184.15, 146.05)
  line L48 (146.05, 184.15) -> (6.35, 184.15)
  line L49 (139.7, 190.5) -> (12.7, 190.5)
  circle A21 centre (76.2, 254) radius 12.7
  line L50 (139.7, 317.5) -> (139.7, 190.5)
  line L51 (146.05, 323.85) -> (146.05, 184.15)
  circle A22 centre (114.3, 215.9) radius 12.7
  circle A23 centre (38.1, 292.1) radius 12.7
  line L52 (12.7, 317.5) -> (139.7, 317.5)
  line L53 (6.35, 323.85) -> (146.05, 323.85)
  line L54 (146.05, 184.15) -> (6.35, 184.15)
  line L55 (139.7, 190.5) -> (12.7, 190.5)
  circle A24 centre (76.2, 254) radius 12.7
  line L56 (139.7, 317.5) -> (139.7, 190.5)
  line L57 (146.05, 323.85) -> (146.05, 184.15)
  circle A25 centre (114.3, 215.9) radius 12.7
  circle A26 centre (38.1, 292.1) radius 12.7
  line L58 (12.7, 317.5) -> (139.7, 317.5)
  line L59 (6.35, 323.85) -> (146.05, 323.85)
  point P0 (0, 355.6)
  dimension "d2" = 25.4
  dimension "d3" = 25.4
  dimension "d4" = 25.4
  dimension "d5" = 25.4
  dimension "d6" = 25.4
  dimension "d7" = 25.4
  dimension "d8" = 152.4
  dimension "d11" = 76.2
  dimension "d32" = 152.4
  dimension "d36" = 139.7
  dimension "d37" = 139.7
  dimension "d38" = 139.7
  dimension "d67" = 152.4
  dimension "d69" = 139.7
  dimension "d70" = 152.4
  dimension "d71" = 152.4
extrude "Extrude1" add sketch "Sketch1" along normal blind 6.35 contours L0 L1 L2 L3 | L18 L19 L20 L21 makes body 1
extrude "Extrude2" add sketch "Sketch1" along normal blind 12.7 contours L18 L19 L20 L21 bodies 1
extrude "Extrude3" add sketch "Sketch1" along normal blind 6.35 separate body contours L8 L9 L33 L44 | L34 L35 L45 L46 makes body 2
extrude "Extrude4" add sketch "Sketch1" along normal blind 12.7 contours L34 L35 L45 L46 bodies 2
extrude "Extrude5" add sketch "Sketch1" along normal blind 6.35 separate body contours L10 L11 L12 L13 | L36 L37 L38 L39 makes body 3
extrude "Extrude6" add sketch "Sketch1" along normal blind 12.7 contours L10 L11 L12 L13 bodies 3
extrude "Extrude7" add sketch "Sketch1" along normal blind 6.35 separate body contours L14 L15 L16 L17 L49 L50 L52 L55 L56 L58 | L40 L41 L42 L43 L48 L51 L53 L54 L57 L59 makes body 4
extrude "Extrude8" add sketch "Sketch1" along normal blind 12.7 contours L14 L15 L16 L17 L49 L50 L52 L55 L56 L58 bodies 4
extrude "Extrude9" add sketch "Sketch1" along normal blind 6.35 separate body contours L26 L27 L28 L47 | L29 L30 L31 L32 makes body 5
extrude "Extrude10" add sketch "Sketch1" along normal blind 12.7 contours L26 L27 L28 L47 bodies 5
extrude "Extrude11" add sketch "Sketch1" along normal blind 6.35 separate body contours L4 L5 L6 L7 | L22 L23 L24 L25 makes body 6
extrude "Extrude12" add sketch "Sketch1" along normal blind 12.7 contours L22 L23 L24 L25 bodies 6
